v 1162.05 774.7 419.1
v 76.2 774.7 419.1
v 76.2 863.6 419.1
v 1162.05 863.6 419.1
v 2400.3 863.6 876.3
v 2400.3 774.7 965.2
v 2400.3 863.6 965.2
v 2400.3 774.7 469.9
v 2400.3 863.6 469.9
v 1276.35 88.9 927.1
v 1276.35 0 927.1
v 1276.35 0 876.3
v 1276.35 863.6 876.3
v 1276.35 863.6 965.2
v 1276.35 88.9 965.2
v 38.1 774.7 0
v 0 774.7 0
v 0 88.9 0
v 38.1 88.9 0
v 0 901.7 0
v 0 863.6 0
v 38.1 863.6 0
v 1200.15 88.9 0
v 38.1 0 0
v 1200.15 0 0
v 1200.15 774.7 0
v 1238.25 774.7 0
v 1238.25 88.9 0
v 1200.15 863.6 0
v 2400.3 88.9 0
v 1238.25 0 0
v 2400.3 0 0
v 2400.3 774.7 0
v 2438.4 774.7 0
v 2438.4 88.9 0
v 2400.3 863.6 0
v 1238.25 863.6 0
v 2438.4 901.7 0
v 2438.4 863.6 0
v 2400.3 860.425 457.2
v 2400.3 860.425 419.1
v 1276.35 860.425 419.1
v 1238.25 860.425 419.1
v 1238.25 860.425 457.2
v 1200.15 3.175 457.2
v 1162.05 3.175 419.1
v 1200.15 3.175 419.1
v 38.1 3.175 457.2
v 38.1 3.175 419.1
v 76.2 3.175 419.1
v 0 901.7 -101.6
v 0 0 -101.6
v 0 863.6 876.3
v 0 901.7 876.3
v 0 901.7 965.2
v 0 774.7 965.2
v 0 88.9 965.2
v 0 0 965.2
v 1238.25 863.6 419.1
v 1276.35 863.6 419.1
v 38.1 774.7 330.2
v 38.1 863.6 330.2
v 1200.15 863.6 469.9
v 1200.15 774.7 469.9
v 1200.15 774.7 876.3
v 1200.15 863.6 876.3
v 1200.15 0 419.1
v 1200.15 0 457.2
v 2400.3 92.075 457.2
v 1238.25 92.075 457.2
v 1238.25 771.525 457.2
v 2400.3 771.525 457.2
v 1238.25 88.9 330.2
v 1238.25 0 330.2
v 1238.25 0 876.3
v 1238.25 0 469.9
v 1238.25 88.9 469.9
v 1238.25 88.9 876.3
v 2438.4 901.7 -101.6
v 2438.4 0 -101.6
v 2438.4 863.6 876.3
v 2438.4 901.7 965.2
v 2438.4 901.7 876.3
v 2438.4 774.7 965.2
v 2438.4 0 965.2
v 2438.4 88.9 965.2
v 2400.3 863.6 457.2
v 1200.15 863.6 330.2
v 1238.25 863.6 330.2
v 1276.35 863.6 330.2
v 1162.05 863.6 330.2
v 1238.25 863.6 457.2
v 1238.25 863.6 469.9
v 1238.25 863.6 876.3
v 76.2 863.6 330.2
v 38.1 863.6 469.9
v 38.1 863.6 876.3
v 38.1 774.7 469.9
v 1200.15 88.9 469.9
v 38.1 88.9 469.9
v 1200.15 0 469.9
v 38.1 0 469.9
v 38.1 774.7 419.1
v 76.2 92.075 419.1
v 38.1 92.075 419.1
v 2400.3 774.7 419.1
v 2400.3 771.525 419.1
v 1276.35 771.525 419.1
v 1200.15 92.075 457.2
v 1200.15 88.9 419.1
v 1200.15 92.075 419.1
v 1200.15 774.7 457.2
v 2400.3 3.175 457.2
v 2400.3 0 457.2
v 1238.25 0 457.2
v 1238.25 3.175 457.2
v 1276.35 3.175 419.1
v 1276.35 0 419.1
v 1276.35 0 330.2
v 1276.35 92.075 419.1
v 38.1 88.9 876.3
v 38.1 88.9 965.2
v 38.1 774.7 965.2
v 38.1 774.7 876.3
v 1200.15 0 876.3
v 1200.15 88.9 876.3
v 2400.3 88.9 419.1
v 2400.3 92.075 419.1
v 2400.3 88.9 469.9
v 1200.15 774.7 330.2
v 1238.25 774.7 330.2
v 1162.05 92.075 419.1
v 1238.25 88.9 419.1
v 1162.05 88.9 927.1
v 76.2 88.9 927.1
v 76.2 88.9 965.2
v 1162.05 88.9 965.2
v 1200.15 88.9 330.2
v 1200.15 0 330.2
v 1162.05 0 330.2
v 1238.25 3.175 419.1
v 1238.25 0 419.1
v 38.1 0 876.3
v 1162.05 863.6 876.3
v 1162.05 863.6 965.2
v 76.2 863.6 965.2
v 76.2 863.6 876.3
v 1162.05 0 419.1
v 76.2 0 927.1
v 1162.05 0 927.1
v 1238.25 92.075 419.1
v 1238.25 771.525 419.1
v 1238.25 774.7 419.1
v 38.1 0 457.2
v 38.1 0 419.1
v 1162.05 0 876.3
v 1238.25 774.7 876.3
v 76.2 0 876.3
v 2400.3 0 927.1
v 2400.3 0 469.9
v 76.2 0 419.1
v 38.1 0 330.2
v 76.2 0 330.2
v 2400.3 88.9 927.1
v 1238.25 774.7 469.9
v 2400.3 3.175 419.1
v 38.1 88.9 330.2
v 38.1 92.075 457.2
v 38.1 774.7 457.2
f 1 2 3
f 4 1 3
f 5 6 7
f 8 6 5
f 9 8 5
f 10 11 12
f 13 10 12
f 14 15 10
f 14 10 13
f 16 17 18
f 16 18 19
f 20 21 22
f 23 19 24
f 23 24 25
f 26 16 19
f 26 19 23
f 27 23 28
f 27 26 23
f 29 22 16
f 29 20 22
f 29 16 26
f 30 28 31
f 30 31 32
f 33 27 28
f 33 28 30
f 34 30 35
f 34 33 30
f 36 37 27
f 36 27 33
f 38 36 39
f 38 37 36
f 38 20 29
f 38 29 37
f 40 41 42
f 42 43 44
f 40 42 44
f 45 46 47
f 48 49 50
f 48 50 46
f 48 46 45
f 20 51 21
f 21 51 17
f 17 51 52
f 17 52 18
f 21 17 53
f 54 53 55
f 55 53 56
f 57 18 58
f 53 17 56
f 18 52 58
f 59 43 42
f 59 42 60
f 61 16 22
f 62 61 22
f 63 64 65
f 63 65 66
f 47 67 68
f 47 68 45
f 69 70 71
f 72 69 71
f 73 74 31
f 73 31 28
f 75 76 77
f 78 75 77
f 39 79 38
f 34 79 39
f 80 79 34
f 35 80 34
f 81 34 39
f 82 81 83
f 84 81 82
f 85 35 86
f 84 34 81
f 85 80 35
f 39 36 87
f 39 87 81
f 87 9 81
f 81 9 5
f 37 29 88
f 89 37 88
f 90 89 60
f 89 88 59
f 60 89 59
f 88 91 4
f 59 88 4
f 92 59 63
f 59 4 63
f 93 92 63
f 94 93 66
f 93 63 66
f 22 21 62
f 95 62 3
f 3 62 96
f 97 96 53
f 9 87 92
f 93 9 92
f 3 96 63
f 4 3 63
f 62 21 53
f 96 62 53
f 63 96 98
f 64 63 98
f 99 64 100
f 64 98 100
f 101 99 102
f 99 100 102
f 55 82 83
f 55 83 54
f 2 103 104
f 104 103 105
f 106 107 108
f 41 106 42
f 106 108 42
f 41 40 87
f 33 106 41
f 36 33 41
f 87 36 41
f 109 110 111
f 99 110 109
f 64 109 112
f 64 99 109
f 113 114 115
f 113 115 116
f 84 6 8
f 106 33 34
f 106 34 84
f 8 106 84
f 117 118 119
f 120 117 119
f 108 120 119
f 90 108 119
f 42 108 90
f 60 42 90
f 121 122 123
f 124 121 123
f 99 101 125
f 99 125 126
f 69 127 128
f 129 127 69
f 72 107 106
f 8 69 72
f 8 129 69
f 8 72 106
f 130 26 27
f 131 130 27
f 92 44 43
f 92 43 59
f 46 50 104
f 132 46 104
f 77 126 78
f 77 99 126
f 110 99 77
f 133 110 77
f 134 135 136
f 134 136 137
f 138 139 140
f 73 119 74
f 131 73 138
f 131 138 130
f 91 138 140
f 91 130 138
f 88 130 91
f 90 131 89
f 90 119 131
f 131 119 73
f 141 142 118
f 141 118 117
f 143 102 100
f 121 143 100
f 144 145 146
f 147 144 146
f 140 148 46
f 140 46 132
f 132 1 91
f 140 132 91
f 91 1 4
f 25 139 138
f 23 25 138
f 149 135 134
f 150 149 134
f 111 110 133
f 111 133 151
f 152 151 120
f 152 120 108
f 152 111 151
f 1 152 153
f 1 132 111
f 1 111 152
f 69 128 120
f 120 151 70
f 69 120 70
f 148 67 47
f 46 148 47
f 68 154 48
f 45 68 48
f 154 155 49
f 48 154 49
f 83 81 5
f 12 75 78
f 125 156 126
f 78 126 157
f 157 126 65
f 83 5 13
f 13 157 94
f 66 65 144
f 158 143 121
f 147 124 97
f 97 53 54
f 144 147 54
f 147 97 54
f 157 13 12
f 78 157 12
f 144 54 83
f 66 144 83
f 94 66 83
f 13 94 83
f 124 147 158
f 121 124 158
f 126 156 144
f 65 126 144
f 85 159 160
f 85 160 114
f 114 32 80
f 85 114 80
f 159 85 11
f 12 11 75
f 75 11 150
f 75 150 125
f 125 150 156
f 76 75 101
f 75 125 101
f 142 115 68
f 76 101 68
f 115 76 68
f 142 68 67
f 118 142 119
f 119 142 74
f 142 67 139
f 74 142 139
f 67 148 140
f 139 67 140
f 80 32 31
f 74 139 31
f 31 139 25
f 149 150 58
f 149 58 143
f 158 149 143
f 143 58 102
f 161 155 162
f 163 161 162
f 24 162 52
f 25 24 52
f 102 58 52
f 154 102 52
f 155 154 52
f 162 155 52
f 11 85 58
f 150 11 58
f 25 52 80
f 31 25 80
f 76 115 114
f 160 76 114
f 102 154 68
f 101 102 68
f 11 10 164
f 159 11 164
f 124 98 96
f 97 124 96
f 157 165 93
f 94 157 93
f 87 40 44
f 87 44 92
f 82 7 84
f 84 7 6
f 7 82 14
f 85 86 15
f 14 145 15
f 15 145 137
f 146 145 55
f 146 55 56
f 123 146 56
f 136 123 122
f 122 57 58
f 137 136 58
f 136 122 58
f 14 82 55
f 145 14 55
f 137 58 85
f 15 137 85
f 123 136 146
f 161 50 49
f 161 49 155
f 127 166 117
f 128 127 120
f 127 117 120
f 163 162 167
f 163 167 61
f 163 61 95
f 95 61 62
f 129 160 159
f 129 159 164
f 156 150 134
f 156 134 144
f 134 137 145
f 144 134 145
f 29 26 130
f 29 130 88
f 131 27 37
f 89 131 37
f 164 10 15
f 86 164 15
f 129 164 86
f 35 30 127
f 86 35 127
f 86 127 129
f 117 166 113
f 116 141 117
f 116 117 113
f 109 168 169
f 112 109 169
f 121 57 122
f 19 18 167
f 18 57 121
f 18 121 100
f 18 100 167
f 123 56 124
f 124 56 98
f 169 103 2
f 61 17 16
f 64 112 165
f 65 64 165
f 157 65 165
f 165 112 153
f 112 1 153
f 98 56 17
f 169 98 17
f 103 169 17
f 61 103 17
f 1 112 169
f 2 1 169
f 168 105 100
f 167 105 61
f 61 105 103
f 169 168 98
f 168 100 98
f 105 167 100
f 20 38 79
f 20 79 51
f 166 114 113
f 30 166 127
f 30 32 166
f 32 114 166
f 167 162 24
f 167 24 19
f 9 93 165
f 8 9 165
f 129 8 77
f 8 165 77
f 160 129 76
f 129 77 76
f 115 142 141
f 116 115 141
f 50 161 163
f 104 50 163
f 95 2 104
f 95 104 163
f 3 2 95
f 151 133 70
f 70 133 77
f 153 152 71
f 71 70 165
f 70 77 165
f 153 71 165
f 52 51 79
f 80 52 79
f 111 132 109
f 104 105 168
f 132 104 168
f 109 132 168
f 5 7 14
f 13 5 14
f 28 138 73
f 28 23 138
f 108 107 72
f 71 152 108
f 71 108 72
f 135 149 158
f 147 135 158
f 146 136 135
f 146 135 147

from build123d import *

# Parameters (mm, degrees)
F0_W           = 38.1
F0_H           = 88.9
F1_DEPTH       = 101.6
F2_DEPTH       = 927.1
F3_W           = 2438.4
F3_H           = 88.9
F4_DEPTH       = 38.1
F5_DEPTH       = 965.2
F6_W           = 2438.4
F6_H           = 88.9
F7_DEPTH       = 38.1
F8_W           = 88.9
F8_H           = 50.8
F9_DEPTH       = 38.1
F8_H_2         = 38.1
F8_W_2         = 3.175
F8_W_3         = 85.725
F10_DEPTH      = 1162.05
F11_W          = 863.6
F11_H          = 88.9
F12_DEPTH      = 38.1
F12_DEPTH_BACK = 76.2
F13_W          = 88.9
F13_H          = 38.1
F14_DEPTH      = 1162.05


with BuildPart() as f1:
    # F0 (on Top) → F1 (new body)
    with BuildSketch(Plane.XY):
        Polygon((38.1, 88.9), (38.1, 0), (1200.15, 0), (1200.15, 88.9), (1238.25, 88.9), (1238.25, 0), (2400.3, 0), (2400.3, 88.9), (2438.4, 88.9), (2438.4, 774.7), (2400.3, 774.7), (2400.3, 863.6), (1238.25, 863.6), (1238.25, 774.7), (1200.15, 774.7), (1200.15, 863.6), (38.1, 863.6), (38.1, 774.7), (0, 774.7), (0, 88.9), align=None)
        with Locations((19.05, 819.15)):
            Rectangle(F0_W, F0_H)
        with Locations((1219.2, 819.15)):
            Rectangle(F0_W, F0_H)
        with Locations((2419.35, 819.15)):
            Rectangle(F0_W, F0_H)
        with Locations((2419.35, 44.45)):
            Rectangle(F0_W, F0_H)
        with Locations((1219.2, 44.45)):
            Rectangle(F0_W, F0_H)
        with Locations((19.05, 44.45)):
            Rectangle(F0_W, F0_H)
        Polygon((0, 901.7), (0, 863.6), (38.1, 863.6), (1200.15, 863.6), (1238.25, 863.6), (2400.3, 863.6), (2438.4, 863.6), (2438.4, 901.7), align=None)
    extrude(amount=-F1_DEPTH)

    # F0 (on Top) → F2 (join)
    with BuildSketch(Plane.XY):
        with Locations((19.05, 44.45)):
            Rectangle(F0_W, F0_H)
        with Locations((2419.35, 44.45)):
            Rectangle(F0_W, F0_H)
        with Locations((1219.2, 44.45)):
            Rectangle(F0_W, F0_H)
    extrude(amount=F2_DEPTH)

    # F3 (on face) → F4 (join)
    with BuildSketch(Plane.XY.offset(927.1)):
        with Locations((1219.2, 44.45)):
            Rectangle(F3_W, F3_H)
    extrude(amount=F4_DEPTH)

    # F0 (on Top) → F5 (join)
    with BuildSketch(Plane.XY):
        with Locations((19.05, 819.15)):
            Rectangle(F0_W, F0_H)
        with Locations((1219.2, 819.15)):
            Rectangle(F0_W, F0_H)
        with Locations((2419.35, 819.15)):
            Rectangle(F0_W, F0_H)
    extrude(amount=F5_DEPTH)

    # F6 (on face) → F7 (join)
    with BuildSketch(Plane(origin=(0, 863.6, 0), x_dir=(-1, 0, 0), z_dir=(0, 1, 0))):
        with Locations((-1219.2, 920.75)):
            Rectangle(F6_W, F6_H)
    extrude(amount=F7_DEPTH)

    # F8 (on face) → F9 (join)
    with BuildSketch(Plane.YZ.offset(38.1)):
        with Locations((44.45, 901.7)):
            Rectangle(F8_W, F8_H)
        Polygon((863.6, 965.2), (0, 965.2), (0, 927.1), (88.9, 927.1), (88.9, 876.3), (863.6, 876.3), align=None)
        Polygon((3.175, 419.1), (0, 419.1), (0, 330.2), (88.9, 330.2), (88.9, 419.1), align=None)
        Polygon((92.075, 419.1), (88.9, 419.1), (88.9, 330.2), (863.6, 330.2), (863.6, 419.1), (774.7, 419.1), align=None)
    extrude(amount=F9_DEPTH)

    # F8 (on face) → F10 (join, through all)
    with BuildSketch(Plane.YZ.offset(38.1)):
        Polygon((88.9, 469.9), (0, 469.9), (0, 457.2), (3.175, 457.2), (88.9, 457.2), align=None)
        Polygon((863.6, 469.9), (88.9, 469.9), (88.9, 457.2), (92.075, 457.2), (774.7, 457.2), (863.6, 457.2), align=None)
        with Locations((819.15, 438.15)):
            Rectangle(F8_W, F8_H_2)
        with Locations((90.4875, 438.15)):
            Rectangle(F8_W_2, F8_H_2)
        with Locations((46.0375, 438.15)):
            Rectangle(F8_W_3, F8_H_2)
    extrude(amount=F10_DEPTH)

    # F11 (on face) → F12 (join, two sides)
    with BuildSketch(Plane.YZ.offset(1238.25)) as f12_sk:
        with Locations((431.8, 920.75)):
            Rectangle(F11_W, F11_H)
        with Locations((431.8, 374.65)):
            Rectangle(F11_W, F11_H)
    extrude(amount=F12_DEPTH)
    extrude(f12_sk.sketch, amount=-F12_DEPTH_BACK)

    # F13 (on face) → F14 (join, through all)
    with BuildSketch(Plane.YZ.offset(1238.25)):
        Polygon((863.6, 469.9), (0, 469.9), (0, 457.2), (3.175, 457.2), (92.075, 457.2), (771.525, 457.2), (860.425, 457.2), (863.6, 457.2), align=None)
        with Locations((47.625, 438.15)):
            Rectangle(F13_W, F13_H)
        with Locations((815.975, 438.15)):
            Rectangle(F13_W, F13_H)
    extrude(amount=F14_DEPTH)


solid = f1.part
